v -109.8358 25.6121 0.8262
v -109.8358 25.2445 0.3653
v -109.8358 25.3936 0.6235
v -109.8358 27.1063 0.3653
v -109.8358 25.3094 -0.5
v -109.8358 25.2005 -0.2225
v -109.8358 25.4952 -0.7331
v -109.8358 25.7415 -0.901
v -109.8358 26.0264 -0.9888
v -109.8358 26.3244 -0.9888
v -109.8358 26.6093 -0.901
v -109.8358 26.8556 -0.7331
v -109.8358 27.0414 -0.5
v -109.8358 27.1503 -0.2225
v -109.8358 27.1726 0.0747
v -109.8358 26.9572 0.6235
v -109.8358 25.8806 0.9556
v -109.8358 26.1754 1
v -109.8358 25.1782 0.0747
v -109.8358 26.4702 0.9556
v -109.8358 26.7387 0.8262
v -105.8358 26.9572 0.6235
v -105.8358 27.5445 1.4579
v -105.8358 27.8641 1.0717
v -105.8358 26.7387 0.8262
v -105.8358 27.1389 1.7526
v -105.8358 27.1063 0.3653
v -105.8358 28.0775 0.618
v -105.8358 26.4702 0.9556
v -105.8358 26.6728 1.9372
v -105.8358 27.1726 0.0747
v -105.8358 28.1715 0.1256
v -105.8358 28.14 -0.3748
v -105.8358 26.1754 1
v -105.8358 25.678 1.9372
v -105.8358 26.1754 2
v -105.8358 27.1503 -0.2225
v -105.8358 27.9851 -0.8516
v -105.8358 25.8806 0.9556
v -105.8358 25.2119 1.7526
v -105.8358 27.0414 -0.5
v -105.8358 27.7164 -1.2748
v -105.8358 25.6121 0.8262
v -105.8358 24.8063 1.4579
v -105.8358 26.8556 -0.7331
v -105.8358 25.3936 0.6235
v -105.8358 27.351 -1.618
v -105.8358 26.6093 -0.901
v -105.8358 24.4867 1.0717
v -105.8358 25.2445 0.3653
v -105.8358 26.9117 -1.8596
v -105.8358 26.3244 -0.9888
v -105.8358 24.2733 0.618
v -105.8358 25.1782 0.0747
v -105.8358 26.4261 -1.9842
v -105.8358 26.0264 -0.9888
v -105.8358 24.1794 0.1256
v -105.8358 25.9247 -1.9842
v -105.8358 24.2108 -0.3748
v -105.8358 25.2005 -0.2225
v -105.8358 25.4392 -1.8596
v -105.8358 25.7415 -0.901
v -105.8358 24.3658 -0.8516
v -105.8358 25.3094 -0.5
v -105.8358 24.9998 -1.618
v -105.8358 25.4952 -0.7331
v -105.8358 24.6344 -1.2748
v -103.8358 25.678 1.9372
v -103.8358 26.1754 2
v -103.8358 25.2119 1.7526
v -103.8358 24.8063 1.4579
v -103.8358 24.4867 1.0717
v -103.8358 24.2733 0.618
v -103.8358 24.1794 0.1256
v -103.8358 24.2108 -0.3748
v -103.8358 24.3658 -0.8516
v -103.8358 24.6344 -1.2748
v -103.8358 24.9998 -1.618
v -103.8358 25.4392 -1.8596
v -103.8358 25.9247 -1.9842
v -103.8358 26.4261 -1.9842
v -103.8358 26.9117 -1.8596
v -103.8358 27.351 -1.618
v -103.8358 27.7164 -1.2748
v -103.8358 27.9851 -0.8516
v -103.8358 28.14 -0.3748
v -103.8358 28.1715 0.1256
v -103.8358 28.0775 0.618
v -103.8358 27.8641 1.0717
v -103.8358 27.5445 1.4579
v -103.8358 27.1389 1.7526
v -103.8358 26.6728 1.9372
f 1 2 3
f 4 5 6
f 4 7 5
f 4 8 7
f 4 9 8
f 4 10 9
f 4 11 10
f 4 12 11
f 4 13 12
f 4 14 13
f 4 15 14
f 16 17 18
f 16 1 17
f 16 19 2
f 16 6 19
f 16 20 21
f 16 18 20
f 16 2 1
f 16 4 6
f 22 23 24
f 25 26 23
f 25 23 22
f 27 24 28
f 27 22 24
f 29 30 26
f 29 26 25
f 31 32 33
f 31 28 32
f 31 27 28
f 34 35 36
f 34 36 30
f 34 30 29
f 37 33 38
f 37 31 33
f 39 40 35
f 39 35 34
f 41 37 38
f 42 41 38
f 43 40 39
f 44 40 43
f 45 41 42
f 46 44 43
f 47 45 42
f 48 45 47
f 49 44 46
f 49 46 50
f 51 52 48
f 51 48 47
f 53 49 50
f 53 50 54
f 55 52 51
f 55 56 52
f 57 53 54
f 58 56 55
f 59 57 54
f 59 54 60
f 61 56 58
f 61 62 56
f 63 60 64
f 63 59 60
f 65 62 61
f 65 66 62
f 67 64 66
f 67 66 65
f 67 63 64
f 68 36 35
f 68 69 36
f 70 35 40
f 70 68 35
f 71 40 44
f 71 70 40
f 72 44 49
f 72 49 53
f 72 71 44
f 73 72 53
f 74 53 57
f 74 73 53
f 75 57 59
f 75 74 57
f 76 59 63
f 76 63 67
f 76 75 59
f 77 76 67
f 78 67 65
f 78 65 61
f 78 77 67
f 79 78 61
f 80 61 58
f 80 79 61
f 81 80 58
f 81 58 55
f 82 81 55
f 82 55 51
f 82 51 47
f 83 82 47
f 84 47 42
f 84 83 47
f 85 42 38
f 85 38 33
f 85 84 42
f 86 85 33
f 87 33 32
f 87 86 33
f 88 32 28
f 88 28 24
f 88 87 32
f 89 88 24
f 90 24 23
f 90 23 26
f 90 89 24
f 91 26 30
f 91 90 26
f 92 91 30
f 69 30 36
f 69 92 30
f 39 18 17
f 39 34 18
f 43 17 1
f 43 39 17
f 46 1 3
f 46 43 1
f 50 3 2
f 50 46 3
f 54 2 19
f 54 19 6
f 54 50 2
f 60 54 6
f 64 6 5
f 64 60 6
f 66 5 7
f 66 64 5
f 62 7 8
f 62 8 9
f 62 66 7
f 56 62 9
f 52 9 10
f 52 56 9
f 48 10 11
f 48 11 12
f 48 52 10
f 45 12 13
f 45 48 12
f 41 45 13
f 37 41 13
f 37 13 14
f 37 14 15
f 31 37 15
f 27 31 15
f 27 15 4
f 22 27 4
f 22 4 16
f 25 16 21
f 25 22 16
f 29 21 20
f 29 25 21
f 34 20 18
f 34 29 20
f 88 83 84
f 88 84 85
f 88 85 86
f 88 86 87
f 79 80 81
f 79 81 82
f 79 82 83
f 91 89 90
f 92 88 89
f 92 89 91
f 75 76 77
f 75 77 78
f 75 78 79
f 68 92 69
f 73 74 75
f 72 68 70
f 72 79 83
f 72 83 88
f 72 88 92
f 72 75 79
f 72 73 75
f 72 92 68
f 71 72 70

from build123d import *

# Parameters (mm, degrees)
SKETCH2_W          = 2.386092155
SKETCH2_H          = 2.248872797
CUT_EXTRUDE1_DEPTH = 3
SKETCH3_W          = 2.355598965
SKETCH3_H          = 2.325105774
CUT_EXTRUDE2_DEPTH = 4


with BuildPart() as part:
    # Sketch1 → Revolve1 (revolve)
    with BuildSketch(Plane.XY, mode=Mode.PRIVATE) as revolve1_sk:
        Polygon((-116.835752997, 27.175404574), (-105.835752997, 27.175404574), (-105.835752997, 28.175404574), (-103.835752997, 28.175404574), (-103.835752997, 26.175404574), (-116.835752997, 26.175404574), align=None)
    revolve(revolve1_sk.sketch.rotate(Axis((-116.835752997, 26.175404574, 0), (1, 0, 0)), 90), axis=Axis((-116.835752997, 26.175404574, 0), (1, 0, 0)))

    # Sketch2 → Cut-Extrude1 (cut)
    with BuildSketch(Plane.ZY.offset(116.835752997)):
        with Locations((0.019058245, 26.198274467)):
            Rectangle(SKETCH2_W, SKETCH2_H)
    extrude(amount=-CUT_EXTRUDE1_DEPTH, mode=Mode.SUBTRACT)

    # Sketch3 → Cut-Extrude2 (cut)
    with BuildSketch(Plane.ZY.offset(113.835752997)):
        with Locations((-0.034304839, 26.259260848)):
            Rectangle(SKETCH3_W, SKETCH3_H)
    extrude(amount=-CUT_EXTRUDE2_DEPTH, mode=Mode.SUBTRACT)


solid = part.part
